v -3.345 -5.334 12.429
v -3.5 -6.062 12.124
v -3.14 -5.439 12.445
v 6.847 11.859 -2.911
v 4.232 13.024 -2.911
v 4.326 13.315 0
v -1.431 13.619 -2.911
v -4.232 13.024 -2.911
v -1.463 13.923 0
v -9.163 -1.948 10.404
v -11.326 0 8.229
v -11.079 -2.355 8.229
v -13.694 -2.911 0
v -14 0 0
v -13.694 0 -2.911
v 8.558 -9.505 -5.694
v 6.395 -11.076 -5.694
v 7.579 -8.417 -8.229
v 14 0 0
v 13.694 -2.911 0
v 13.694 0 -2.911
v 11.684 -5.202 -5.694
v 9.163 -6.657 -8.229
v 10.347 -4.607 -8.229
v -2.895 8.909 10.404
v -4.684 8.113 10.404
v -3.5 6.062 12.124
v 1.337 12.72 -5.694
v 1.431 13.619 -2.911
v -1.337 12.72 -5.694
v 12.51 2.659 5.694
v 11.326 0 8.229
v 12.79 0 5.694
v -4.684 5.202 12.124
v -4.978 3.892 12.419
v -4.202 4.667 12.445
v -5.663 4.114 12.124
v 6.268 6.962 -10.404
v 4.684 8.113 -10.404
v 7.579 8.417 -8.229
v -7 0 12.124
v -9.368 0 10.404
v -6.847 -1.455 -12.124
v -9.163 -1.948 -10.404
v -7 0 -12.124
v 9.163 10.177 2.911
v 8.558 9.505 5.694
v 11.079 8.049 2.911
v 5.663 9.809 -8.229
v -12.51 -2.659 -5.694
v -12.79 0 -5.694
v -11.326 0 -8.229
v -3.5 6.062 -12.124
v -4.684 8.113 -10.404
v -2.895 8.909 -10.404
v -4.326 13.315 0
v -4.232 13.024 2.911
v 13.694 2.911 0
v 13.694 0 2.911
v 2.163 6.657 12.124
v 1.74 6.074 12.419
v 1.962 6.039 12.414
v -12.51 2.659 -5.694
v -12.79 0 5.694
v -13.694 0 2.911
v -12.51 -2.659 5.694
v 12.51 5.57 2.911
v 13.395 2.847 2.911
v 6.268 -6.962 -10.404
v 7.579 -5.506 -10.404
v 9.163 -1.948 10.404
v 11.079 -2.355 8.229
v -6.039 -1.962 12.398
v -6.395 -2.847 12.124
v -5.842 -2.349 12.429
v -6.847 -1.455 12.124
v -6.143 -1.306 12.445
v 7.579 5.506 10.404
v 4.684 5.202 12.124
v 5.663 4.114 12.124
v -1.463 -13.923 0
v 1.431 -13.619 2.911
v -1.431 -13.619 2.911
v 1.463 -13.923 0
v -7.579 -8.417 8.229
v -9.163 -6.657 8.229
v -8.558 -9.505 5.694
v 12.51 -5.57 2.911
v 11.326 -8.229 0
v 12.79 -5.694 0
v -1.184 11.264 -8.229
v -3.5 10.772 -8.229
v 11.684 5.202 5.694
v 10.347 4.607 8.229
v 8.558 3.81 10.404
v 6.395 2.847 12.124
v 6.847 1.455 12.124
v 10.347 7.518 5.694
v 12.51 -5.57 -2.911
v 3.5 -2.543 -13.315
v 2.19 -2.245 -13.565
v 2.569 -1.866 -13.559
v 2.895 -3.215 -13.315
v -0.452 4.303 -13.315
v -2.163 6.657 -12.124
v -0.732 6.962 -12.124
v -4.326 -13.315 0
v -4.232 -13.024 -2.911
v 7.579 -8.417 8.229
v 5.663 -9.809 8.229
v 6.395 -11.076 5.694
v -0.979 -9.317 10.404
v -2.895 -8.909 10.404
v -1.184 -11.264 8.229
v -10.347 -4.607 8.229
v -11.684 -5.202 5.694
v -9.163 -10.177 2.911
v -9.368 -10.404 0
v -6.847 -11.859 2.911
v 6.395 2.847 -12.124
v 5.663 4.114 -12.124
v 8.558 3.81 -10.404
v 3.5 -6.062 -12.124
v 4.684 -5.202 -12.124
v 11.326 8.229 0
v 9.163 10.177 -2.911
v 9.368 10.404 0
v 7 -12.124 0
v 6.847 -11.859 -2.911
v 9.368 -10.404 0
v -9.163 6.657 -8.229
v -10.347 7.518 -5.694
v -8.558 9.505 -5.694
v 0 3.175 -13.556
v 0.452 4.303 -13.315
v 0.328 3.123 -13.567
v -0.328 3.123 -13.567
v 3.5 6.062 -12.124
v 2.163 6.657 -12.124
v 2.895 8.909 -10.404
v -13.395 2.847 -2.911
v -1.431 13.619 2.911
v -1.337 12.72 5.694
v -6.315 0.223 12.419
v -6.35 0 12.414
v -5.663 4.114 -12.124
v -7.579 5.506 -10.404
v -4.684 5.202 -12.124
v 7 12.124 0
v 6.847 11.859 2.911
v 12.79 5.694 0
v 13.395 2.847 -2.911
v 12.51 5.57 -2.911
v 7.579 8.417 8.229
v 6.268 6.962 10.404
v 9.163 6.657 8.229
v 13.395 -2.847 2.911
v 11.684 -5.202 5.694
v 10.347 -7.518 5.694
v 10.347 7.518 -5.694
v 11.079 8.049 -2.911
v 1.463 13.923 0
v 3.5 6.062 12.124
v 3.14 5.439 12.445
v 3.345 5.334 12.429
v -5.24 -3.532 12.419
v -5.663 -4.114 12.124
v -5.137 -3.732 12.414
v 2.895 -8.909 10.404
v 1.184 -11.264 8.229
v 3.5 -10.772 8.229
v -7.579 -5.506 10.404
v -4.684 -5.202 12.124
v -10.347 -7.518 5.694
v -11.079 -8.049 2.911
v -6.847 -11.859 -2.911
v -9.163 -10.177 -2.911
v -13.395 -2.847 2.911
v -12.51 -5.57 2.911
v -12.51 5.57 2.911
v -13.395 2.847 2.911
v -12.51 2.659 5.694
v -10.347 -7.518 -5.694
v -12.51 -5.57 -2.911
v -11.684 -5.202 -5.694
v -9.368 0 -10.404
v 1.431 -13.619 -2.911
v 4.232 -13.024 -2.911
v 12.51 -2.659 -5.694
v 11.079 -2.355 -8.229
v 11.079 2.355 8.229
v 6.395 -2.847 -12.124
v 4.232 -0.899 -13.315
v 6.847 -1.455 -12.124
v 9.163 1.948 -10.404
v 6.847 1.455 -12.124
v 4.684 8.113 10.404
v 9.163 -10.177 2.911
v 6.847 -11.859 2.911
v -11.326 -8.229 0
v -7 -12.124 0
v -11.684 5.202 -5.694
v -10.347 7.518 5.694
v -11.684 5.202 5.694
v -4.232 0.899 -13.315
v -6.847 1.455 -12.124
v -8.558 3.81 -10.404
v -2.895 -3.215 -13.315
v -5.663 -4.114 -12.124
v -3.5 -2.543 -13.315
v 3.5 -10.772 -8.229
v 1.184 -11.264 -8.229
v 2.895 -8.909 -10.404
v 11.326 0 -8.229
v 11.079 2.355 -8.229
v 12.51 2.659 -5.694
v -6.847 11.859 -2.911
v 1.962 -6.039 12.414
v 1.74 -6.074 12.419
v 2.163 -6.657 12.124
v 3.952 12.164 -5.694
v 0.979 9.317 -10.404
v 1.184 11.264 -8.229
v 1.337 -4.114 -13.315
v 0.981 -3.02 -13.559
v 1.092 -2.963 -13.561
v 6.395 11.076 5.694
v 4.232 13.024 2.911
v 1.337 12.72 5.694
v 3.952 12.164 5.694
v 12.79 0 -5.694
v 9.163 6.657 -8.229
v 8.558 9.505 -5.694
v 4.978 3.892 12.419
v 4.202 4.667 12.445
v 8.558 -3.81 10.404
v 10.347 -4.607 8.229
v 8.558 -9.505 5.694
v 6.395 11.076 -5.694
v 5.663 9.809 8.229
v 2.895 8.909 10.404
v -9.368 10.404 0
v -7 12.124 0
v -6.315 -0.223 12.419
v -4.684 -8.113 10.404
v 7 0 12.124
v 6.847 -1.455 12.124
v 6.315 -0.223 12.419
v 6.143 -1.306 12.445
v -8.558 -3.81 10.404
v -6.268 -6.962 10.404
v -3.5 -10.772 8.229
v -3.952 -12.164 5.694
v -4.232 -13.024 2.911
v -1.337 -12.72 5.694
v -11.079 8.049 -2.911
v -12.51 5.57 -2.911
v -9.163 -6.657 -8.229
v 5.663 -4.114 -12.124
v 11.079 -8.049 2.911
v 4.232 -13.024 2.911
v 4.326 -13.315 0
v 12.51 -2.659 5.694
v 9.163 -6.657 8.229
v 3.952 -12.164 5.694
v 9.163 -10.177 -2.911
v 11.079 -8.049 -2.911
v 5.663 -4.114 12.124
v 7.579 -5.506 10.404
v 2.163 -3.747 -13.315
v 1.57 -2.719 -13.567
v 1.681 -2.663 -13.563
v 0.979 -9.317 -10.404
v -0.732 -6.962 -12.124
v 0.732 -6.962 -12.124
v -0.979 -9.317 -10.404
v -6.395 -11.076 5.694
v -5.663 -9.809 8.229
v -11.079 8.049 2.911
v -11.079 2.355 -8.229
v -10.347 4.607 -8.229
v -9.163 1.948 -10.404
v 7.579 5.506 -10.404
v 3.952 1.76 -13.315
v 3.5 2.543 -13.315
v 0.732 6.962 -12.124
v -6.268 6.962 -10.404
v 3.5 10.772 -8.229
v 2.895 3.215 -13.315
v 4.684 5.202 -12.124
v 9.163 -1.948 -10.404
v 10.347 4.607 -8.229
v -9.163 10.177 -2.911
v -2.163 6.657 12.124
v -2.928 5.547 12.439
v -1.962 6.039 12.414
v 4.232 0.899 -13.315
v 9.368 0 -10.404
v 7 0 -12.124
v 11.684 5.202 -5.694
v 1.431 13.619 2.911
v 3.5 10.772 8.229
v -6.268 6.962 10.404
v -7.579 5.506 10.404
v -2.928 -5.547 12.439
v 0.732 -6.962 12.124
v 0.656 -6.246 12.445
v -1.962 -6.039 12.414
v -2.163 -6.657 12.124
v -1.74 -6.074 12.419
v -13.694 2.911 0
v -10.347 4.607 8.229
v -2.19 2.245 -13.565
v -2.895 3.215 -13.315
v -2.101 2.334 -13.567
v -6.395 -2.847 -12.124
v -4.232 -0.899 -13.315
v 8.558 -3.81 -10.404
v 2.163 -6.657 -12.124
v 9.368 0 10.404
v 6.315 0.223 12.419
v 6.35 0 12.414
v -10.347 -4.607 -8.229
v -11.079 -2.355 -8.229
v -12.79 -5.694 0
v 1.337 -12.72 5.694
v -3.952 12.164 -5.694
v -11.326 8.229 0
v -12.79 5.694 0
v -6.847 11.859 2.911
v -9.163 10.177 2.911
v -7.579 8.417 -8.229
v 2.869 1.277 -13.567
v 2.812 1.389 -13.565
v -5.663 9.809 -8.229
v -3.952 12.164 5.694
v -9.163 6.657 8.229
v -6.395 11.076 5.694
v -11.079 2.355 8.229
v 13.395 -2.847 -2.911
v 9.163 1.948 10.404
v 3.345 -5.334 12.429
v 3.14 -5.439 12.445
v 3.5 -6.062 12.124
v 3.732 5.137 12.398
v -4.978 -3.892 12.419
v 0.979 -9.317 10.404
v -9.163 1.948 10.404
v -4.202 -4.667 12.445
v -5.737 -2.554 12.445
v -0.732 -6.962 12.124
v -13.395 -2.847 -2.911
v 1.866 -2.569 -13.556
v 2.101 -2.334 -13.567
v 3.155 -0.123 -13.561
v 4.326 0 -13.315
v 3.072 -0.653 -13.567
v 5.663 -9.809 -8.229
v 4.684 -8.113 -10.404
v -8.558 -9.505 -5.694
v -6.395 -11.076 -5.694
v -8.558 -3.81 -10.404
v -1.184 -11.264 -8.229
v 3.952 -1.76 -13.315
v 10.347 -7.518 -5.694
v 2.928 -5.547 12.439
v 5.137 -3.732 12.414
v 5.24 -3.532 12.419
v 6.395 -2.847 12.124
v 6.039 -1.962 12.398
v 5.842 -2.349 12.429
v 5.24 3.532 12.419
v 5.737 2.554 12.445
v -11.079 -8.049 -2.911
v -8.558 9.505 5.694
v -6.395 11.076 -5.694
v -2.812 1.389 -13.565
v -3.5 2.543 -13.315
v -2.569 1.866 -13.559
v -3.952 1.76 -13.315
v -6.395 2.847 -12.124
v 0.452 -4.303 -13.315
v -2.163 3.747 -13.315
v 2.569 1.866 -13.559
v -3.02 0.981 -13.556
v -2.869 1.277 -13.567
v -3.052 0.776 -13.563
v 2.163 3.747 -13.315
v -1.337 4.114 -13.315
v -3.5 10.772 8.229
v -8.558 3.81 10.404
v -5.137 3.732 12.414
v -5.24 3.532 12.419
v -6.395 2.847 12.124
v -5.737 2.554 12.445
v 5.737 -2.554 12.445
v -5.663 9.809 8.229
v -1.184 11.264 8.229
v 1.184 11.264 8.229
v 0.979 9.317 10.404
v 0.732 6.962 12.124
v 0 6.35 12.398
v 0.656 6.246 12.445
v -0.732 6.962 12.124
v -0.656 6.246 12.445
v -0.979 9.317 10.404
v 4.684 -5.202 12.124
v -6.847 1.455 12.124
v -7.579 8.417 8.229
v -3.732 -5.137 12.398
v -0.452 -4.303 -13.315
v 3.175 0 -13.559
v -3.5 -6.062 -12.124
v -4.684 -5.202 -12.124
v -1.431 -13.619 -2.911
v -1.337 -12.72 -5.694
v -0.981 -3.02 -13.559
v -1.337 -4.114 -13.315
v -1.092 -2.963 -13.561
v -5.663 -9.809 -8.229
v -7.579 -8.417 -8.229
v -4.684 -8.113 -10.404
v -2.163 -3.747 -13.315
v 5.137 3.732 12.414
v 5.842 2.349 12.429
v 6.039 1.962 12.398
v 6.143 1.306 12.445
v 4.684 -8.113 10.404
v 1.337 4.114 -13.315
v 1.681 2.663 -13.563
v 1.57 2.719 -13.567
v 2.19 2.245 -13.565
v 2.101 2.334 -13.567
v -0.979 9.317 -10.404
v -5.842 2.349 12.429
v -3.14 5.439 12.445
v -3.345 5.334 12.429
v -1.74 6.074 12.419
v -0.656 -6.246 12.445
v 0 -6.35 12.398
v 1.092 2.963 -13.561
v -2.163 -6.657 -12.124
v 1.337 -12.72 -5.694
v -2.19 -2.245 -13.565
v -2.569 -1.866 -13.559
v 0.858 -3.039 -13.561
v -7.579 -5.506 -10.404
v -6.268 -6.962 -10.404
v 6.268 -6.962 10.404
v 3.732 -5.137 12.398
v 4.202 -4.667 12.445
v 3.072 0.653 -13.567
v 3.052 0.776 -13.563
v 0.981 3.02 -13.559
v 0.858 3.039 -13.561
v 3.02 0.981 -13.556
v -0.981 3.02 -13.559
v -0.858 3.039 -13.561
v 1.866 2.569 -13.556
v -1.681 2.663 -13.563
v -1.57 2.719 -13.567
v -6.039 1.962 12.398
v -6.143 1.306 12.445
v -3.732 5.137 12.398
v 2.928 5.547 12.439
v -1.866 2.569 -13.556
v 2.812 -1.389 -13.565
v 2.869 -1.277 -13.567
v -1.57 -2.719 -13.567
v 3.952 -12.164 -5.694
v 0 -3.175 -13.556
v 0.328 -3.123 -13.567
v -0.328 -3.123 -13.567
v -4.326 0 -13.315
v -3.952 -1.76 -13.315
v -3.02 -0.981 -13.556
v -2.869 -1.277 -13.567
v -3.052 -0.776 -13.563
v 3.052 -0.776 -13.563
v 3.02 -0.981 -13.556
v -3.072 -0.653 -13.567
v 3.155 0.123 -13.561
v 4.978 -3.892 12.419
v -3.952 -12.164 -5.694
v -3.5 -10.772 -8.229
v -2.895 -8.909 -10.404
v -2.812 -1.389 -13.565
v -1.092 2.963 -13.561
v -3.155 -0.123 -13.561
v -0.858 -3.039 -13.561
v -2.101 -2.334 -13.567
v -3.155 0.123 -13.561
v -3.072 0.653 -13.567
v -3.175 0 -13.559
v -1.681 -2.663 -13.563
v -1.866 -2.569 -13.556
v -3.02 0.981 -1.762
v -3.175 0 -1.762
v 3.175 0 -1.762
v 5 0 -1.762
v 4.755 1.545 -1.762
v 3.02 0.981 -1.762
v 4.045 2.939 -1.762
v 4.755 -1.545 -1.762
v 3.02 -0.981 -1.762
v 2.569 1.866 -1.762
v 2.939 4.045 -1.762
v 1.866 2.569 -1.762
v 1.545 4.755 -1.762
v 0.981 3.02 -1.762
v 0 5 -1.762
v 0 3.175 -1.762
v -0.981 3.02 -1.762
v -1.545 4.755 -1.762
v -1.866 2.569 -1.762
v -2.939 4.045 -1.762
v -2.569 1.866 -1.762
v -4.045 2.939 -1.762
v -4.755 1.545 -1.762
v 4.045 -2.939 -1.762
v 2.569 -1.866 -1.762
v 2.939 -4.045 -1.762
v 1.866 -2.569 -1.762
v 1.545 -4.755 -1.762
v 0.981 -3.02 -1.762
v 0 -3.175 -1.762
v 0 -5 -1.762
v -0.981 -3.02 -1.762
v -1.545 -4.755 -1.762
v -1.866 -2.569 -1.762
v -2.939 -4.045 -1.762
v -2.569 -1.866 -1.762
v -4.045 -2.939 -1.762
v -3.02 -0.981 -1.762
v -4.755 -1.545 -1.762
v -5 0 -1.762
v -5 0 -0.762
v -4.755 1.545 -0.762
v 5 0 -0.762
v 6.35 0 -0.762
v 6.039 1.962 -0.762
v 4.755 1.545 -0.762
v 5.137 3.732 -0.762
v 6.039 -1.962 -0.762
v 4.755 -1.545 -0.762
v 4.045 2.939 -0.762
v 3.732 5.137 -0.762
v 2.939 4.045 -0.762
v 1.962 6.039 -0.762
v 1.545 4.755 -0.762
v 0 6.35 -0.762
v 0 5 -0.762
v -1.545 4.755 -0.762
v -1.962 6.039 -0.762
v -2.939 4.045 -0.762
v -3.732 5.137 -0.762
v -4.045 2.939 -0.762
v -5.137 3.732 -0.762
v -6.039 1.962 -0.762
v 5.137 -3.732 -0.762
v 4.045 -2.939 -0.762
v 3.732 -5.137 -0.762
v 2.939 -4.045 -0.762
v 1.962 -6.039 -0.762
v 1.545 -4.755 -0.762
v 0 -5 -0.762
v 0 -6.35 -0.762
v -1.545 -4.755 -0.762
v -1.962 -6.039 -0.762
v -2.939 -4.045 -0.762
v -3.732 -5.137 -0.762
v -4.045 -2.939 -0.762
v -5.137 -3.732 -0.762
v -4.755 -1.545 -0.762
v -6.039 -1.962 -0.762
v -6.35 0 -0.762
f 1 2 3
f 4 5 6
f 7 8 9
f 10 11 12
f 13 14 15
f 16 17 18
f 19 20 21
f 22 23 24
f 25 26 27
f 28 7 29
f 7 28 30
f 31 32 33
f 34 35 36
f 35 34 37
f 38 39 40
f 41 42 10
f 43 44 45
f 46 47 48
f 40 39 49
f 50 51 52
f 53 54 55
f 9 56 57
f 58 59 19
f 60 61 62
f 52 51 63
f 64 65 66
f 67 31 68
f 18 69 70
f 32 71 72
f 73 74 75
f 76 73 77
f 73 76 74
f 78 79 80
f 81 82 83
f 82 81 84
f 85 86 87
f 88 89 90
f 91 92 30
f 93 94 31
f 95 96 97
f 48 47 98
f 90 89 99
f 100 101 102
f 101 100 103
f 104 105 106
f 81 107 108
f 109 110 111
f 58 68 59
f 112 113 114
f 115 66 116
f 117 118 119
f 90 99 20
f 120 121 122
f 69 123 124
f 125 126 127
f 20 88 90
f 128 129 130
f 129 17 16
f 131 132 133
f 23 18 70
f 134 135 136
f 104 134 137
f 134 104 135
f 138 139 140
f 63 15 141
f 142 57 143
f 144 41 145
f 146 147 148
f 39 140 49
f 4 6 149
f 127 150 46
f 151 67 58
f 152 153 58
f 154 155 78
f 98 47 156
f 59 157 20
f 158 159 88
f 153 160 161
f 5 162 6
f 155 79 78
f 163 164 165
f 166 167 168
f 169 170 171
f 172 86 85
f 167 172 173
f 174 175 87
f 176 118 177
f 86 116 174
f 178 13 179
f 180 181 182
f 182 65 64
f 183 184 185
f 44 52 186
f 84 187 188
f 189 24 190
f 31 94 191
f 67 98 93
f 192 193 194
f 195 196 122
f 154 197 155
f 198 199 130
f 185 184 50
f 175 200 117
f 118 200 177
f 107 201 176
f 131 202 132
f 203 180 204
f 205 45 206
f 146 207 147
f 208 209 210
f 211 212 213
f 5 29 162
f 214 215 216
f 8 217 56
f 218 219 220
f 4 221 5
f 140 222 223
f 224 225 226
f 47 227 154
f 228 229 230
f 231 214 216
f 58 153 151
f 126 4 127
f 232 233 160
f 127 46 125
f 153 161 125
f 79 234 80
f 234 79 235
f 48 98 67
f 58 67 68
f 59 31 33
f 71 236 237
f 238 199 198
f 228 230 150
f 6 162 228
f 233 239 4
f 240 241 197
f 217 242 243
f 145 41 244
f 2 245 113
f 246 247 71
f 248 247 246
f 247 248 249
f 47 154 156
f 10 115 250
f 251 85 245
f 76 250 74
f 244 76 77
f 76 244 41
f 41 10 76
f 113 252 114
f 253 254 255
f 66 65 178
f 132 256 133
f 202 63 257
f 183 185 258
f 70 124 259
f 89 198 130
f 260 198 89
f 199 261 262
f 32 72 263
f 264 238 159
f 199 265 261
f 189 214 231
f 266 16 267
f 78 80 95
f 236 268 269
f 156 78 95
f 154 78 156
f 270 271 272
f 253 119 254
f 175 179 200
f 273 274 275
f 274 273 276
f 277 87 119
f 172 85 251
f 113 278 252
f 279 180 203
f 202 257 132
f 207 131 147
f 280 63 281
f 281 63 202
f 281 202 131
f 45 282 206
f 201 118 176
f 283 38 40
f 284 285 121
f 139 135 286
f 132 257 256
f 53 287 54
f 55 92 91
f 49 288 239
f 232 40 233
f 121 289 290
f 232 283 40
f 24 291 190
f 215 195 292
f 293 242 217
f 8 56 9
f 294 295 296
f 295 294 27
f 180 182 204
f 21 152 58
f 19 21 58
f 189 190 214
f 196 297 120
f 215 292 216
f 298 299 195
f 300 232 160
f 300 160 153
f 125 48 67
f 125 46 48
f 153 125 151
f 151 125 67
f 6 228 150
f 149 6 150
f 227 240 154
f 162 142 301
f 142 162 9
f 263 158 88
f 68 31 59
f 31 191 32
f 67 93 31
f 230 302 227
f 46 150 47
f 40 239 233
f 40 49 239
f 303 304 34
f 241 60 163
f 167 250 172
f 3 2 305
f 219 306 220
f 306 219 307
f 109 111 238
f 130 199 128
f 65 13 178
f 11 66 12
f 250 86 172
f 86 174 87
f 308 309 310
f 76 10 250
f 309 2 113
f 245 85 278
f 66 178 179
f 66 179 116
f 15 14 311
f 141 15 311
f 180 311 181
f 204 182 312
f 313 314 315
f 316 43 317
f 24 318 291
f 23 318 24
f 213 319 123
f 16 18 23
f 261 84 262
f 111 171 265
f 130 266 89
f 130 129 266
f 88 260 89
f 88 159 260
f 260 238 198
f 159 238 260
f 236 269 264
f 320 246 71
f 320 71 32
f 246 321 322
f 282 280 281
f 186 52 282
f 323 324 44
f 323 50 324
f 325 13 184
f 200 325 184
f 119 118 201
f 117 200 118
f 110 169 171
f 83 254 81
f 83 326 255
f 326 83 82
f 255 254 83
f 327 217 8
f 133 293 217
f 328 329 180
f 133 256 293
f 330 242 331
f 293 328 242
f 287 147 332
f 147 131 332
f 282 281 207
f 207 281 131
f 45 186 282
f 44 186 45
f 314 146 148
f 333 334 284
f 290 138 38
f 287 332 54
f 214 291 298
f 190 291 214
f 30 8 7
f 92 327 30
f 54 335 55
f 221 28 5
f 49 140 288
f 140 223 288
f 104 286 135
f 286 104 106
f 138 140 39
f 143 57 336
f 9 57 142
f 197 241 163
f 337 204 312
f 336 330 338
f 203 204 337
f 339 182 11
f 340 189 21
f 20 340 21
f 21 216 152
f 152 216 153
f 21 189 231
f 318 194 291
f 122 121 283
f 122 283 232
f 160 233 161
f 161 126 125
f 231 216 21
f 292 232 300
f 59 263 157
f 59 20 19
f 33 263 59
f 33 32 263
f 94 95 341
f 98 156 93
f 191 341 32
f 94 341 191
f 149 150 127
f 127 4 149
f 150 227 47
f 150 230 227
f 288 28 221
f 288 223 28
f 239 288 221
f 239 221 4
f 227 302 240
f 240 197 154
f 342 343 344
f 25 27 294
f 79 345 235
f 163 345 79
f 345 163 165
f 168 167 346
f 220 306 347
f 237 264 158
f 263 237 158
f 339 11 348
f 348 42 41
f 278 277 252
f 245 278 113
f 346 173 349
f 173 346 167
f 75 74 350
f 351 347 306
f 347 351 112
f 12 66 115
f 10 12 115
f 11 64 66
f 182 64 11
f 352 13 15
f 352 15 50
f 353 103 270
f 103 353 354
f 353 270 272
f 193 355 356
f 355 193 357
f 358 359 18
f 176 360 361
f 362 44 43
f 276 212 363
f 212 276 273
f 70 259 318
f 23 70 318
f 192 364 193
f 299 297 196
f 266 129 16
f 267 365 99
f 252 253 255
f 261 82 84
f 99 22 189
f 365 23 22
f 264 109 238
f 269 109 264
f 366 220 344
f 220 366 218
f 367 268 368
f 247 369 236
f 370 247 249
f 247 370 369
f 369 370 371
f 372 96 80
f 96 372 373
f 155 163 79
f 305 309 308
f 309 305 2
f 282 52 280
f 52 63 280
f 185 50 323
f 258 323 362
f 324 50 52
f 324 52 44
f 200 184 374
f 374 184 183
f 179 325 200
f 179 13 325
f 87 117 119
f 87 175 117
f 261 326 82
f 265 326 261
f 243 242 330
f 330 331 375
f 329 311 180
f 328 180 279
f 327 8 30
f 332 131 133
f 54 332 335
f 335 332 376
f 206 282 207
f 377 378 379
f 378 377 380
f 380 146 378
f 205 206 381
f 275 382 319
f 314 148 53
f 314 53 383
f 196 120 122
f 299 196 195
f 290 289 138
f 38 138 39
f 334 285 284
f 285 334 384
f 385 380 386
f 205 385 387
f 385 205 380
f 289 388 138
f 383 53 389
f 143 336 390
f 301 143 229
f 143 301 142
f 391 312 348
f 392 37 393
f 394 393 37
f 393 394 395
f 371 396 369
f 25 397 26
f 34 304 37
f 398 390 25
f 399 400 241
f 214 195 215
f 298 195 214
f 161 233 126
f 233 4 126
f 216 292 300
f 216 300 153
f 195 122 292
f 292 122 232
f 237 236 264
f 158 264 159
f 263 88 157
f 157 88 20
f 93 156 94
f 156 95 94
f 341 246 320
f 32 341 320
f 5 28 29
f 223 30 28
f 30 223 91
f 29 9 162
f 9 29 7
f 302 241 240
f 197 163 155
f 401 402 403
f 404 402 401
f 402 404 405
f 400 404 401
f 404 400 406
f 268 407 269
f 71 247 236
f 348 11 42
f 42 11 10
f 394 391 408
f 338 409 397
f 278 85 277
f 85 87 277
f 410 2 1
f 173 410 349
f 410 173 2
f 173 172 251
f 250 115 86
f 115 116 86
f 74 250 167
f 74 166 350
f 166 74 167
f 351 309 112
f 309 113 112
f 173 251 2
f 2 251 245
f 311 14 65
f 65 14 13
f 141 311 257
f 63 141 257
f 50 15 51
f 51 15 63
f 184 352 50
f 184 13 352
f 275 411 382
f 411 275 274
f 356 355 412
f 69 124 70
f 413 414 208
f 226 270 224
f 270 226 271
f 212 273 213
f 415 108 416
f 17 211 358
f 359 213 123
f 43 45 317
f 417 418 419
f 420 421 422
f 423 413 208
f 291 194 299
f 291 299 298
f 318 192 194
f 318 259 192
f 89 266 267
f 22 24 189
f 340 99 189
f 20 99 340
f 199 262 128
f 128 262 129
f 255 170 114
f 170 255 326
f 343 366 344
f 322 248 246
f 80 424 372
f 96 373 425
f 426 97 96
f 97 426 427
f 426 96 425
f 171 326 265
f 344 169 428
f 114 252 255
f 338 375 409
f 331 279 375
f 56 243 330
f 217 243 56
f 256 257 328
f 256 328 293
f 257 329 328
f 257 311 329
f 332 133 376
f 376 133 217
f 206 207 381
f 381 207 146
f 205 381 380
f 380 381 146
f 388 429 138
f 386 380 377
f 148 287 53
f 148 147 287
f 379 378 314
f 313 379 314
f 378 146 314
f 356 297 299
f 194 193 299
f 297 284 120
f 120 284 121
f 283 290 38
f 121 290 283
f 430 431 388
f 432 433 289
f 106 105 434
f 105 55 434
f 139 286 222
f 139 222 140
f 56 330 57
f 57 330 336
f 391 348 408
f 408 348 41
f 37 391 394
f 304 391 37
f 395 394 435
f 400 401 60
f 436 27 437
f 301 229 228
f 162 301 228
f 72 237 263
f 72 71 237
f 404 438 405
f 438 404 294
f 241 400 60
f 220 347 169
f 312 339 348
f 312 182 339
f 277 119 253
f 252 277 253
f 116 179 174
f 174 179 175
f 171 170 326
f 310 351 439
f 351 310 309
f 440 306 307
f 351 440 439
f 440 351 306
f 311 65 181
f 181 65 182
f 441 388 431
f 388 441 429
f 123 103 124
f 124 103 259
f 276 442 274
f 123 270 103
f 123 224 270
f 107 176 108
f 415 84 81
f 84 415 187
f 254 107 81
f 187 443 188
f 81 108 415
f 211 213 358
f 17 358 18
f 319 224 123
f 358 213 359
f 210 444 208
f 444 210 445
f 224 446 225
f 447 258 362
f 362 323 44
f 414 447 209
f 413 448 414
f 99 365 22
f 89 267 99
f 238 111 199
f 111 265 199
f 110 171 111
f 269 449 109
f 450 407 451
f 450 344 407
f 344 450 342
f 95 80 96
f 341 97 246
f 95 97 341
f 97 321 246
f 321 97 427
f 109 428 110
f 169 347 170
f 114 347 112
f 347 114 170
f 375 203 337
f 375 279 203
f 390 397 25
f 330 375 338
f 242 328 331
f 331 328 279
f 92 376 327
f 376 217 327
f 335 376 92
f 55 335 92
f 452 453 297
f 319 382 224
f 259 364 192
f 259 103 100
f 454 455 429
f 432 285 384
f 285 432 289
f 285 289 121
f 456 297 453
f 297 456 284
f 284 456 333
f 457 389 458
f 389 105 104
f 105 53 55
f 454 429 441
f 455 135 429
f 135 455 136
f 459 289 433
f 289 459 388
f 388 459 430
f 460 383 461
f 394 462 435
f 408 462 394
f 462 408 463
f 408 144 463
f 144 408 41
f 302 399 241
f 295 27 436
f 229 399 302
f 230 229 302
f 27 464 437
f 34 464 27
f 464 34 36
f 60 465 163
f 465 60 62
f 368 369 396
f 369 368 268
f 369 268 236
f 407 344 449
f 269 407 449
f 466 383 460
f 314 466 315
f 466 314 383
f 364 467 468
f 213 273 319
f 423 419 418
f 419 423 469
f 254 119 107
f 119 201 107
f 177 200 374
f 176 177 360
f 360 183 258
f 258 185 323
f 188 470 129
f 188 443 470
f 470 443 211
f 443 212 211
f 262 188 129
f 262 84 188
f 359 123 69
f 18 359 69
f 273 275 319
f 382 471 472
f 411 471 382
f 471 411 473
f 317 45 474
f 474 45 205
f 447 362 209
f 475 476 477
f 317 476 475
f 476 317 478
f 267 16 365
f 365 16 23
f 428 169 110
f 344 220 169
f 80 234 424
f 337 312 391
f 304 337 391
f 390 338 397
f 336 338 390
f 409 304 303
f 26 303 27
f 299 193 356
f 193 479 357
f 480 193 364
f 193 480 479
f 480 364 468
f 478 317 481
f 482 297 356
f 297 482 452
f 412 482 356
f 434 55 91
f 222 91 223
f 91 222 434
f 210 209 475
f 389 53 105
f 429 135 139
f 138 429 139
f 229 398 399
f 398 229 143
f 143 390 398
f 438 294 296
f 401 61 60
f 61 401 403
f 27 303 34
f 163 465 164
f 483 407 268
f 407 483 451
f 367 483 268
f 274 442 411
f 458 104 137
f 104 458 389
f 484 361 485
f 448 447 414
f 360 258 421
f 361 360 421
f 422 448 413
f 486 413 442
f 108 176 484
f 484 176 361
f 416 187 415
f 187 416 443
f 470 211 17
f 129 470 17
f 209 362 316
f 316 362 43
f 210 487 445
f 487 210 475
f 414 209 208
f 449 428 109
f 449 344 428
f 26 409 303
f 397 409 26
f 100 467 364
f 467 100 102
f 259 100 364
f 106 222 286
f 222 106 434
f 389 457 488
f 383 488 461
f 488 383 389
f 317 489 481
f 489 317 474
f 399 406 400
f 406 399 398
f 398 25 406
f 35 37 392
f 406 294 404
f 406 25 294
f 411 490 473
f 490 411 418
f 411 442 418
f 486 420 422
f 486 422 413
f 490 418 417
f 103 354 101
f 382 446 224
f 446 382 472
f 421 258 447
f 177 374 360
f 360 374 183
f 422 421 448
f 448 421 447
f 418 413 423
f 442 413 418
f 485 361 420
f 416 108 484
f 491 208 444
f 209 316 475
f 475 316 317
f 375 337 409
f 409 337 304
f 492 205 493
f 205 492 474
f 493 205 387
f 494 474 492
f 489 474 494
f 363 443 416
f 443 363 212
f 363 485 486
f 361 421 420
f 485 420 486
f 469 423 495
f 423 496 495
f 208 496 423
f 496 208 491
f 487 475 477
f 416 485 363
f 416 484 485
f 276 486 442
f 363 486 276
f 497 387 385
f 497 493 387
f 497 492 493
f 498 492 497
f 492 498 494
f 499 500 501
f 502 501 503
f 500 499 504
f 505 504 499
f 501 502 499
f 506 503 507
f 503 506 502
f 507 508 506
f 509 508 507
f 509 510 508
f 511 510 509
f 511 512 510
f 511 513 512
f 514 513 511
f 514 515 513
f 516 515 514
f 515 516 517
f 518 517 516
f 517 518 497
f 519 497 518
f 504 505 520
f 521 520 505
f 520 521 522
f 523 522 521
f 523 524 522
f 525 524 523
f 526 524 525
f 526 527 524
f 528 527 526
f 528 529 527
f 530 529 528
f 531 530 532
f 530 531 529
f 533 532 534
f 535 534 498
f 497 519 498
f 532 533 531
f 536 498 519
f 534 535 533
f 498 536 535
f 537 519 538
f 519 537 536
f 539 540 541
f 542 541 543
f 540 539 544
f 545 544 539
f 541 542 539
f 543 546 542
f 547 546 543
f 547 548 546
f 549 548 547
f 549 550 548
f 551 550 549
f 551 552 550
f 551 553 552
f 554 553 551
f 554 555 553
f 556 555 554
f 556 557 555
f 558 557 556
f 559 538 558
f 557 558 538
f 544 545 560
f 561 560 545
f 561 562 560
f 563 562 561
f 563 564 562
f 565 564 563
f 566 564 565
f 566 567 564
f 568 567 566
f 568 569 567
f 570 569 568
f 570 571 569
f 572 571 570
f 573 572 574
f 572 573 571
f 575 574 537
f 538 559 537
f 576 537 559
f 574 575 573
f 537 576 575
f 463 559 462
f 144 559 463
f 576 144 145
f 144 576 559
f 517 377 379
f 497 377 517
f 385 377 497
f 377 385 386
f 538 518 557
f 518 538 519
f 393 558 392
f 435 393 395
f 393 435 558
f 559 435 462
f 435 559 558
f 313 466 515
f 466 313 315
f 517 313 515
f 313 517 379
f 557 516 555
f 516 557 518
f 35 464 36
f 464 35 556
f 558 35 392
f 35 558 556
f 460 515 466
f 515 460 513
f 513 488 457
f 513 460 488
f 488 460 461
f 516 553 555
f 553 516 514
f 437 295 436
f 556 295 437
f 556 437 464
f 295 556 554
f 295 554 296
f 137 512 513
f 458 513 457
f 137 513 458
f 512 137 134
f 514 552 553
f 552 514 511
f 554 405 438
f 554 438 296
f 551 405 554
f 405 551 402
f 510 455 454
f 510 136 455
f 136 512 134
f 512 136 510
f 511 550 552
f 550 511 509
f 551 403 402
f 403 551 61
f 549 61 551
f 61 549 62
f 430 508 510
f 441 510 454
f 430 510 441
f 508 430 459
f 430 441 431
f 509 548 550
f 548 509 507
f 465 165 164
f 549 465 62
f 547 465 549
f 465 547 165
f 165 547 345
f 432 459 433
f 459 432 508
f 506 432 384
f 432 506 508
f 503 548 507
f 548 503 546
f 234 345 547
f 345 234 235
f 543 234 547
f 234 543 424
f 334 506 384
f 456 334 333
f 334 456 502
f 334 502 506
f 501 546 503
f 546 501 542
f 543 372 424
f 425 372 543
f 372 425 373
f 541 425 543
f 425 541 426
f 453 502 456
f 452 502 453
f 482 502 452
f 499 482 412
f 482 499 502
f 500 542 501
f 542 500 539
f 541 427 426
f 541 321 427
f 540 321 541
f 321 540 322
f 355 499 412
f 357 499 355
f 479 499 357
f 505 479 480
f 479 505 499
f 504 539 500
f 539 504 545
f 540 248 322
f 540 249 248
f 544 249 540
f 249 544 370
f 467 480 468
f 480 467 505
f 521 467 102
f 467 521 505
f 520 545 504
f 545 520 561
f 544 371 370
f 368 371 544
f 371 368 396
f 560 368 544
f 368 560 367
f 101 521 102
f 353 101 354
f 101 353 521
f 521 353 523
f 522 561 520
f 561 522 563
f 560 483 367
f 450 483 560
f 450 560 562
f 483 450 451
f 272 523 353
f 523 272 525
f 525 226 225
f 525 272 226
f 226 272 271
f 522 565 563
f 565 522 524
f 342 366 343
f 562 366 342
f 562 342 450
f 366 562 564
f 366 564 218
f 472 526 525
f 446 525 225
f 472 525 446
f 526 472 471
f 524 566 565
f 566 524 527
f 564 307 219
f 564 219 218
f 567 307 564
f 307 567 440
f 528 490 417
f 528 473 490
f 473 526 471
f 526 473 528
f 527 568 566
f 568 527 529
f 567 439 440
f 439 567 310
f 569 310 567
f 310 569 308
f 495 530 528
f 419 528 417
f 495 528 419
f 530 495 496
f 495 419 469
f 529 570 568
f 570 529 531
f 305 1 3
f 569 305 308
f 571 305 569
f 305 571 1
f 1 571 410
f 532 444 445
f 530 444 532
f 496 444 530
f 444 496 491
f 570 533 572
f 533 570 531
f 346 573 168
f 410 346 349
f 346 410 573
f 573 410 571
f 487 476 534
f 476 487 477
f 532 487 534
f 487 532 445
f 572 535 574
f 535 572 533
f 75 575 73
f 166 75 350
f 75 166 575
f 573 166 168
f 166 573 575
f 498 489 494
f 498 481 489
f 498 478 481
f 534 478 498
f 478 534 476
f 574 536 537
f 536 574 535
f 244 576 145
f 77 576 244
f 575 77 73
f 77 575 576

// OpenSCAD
bearing_radius=6.35;
bearing_hole_radius=3.175;
bearing_width= 4.762;

width=28;
height=28;
bead_radius=5;
bead_hole_depth=bead_radius*2+bearing_width;
bead_hole_groove_depth=1;
bead_hole_groove_radius=5;

module body() {
    sphere(width/2);
}

module hole() {
    module hole_profile() {
        translate([bearing_hole_radius/2, 0, 0]) square([bearing_hole_radius, width], center=true);
       translate([bearing_radius/2, height/2-bead_hole_depth/2, 0])square([bearing_radius, bead_hole_depth], center=true);
      translate([bead_hole_groove_radius/2, height/2-bead_hole_depth-bead_hole_groove_depth/2, 0]) square([bead_hole_groove_radius, bead_hole_groove_depth], center=true);   
    }
    rotate_extrude() hole_profile();
}

difference(){
    body();
    hole();
}
